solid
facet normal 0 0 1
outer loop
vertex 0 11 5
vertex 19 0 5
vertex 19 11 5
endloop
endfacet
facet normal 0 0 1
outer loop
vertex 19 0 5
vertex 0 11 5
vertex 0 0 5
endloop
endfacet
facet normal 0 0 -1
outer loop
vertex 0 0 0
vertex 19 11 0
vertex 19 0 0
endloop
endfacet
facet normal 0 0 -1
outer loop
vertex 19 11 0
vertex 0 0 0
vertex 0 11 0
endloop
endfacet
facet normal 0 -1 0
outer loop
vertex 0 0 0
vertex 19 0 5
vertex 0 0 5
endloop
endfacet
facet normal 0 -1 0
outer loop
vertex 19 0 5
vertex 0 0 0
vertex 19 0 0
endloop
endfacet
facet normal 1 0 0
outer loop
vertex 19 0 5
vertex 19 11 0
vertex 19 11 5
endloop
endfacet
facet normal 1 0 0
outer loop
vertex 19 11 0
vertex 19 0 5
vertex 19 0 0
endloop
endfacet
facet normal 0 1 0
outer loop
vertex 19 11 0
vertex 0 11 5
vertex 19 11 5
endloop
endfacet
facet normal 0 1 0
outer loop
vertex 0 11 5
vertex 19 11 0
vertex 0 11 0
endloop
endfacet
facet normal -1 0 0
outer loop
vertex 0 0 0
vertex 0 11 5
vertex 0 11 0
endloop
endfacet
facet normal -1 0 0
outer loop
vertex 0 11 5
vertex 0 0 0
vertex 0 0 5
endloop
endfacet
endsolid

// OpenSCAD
// Generated by SolidPython 1.0.1 on 2020-07-29 00:46:56


cube(size = [19, 11, 5]);
/***********************************************
*********      SolidPython code:      **********
************************************************
 
# import packages: SolidPython
from solid import *
from solid.utils import *
from itertools import chain, combinations, permutations


class Resize:

    def __init__(self, scad_file):
        self.scad_file = scad_file
        #self.scad_file = import_scad(scad_file)
        # cone/cylinder param:
        self.r1 = 0
        self.r2 = 0
        self.h = 0
        # rectangular prism param:
        self.w = 0
        self.l = 0
        # ellipse param:
        self.r = 0

    # import OpenScad code (file name corresponds to shape)


    # classify shape + parameters
    def assign(self, param1, param2, param3):
        if self.scad_file == 'cone.scad':
            self.r1 = param1
            self.r2 = param2
            self.h = param3
        elif self.scad_file == 'cylinder.scad':
            self.r1 = param1
            self.r2 = param2
            self.h = param3
        elif self.scad_file == 'rectangularPrism.scad':
            self.h = param1
            self.l = param2
            self.w = param3
        else:
            self.r = param1
            self.h = param2

    # resize parameters
    def iterate(self):
        x = range(3, 20, 2)
        i = 1
        if self.scad_file == 'cone.scad':
            tempList = list(permutations(x, 2))
            for temp in tempList:
                param1 = temp[0]
                param2 = temp[1]
                filepath = 'produced_scad_files/' + 'cone' + str(param1) + '_' + str(param2) + '_' + '.scad'
                scad_render_to_file(cylinder(h=param1, r1=param2, r2=0), filepath)

        elif self.scad_file == 'cylinder.scad':
            tempList = list(permutations(x, 3))
            for temp in tempList:
                param1 = temp[0]
                param2 = temp[1]
                filepath = 'produced_scad_files/' + 'cylinder' + str(param1) + '_' + str(param2) + '_' + '.scad'
                scad_render_to_file(cylinder(h=param1, r1=param2, r2=param2), filepath)

        elif self.scad_file == 'rectangularPrism.scad':
            tempList = list(permutations(x, 3))
            for temp in tempList:
                param1 = temp[0]
                param2 = temp[1]
                param3 = temp[2]
                filepath = 'produced_scad_files/' + 'rectangularPrism' + str(param1) + '_' + str(param2) + '_' + str(
                    param3) + '.scad'
                scad_render_to_file(cube(size=(param1, param2, param3)), filepath)

        elif self.scad_file == 'ellipse.scad':
            tempList = list(permutations(x, 4))
            for temp in tempList:
                param1 = temp[0]
                param2 = temp[1]
                param3 = temp[2]
                param4 = temp[3]
                filepath = 'produced_scad_files/' + 'ellipse' + str(param1) + '_' + str(param2) + '_' + str(param3) + '_' + str(param4) + '.scad'
                scad_render_to_file(scale([param1, param2, param3])(sphere(r=param4)), filepath)

    def render_to_scadfile(self):
        scad_render_to_file(scad, 'example.scad') 
 
************************************************/
